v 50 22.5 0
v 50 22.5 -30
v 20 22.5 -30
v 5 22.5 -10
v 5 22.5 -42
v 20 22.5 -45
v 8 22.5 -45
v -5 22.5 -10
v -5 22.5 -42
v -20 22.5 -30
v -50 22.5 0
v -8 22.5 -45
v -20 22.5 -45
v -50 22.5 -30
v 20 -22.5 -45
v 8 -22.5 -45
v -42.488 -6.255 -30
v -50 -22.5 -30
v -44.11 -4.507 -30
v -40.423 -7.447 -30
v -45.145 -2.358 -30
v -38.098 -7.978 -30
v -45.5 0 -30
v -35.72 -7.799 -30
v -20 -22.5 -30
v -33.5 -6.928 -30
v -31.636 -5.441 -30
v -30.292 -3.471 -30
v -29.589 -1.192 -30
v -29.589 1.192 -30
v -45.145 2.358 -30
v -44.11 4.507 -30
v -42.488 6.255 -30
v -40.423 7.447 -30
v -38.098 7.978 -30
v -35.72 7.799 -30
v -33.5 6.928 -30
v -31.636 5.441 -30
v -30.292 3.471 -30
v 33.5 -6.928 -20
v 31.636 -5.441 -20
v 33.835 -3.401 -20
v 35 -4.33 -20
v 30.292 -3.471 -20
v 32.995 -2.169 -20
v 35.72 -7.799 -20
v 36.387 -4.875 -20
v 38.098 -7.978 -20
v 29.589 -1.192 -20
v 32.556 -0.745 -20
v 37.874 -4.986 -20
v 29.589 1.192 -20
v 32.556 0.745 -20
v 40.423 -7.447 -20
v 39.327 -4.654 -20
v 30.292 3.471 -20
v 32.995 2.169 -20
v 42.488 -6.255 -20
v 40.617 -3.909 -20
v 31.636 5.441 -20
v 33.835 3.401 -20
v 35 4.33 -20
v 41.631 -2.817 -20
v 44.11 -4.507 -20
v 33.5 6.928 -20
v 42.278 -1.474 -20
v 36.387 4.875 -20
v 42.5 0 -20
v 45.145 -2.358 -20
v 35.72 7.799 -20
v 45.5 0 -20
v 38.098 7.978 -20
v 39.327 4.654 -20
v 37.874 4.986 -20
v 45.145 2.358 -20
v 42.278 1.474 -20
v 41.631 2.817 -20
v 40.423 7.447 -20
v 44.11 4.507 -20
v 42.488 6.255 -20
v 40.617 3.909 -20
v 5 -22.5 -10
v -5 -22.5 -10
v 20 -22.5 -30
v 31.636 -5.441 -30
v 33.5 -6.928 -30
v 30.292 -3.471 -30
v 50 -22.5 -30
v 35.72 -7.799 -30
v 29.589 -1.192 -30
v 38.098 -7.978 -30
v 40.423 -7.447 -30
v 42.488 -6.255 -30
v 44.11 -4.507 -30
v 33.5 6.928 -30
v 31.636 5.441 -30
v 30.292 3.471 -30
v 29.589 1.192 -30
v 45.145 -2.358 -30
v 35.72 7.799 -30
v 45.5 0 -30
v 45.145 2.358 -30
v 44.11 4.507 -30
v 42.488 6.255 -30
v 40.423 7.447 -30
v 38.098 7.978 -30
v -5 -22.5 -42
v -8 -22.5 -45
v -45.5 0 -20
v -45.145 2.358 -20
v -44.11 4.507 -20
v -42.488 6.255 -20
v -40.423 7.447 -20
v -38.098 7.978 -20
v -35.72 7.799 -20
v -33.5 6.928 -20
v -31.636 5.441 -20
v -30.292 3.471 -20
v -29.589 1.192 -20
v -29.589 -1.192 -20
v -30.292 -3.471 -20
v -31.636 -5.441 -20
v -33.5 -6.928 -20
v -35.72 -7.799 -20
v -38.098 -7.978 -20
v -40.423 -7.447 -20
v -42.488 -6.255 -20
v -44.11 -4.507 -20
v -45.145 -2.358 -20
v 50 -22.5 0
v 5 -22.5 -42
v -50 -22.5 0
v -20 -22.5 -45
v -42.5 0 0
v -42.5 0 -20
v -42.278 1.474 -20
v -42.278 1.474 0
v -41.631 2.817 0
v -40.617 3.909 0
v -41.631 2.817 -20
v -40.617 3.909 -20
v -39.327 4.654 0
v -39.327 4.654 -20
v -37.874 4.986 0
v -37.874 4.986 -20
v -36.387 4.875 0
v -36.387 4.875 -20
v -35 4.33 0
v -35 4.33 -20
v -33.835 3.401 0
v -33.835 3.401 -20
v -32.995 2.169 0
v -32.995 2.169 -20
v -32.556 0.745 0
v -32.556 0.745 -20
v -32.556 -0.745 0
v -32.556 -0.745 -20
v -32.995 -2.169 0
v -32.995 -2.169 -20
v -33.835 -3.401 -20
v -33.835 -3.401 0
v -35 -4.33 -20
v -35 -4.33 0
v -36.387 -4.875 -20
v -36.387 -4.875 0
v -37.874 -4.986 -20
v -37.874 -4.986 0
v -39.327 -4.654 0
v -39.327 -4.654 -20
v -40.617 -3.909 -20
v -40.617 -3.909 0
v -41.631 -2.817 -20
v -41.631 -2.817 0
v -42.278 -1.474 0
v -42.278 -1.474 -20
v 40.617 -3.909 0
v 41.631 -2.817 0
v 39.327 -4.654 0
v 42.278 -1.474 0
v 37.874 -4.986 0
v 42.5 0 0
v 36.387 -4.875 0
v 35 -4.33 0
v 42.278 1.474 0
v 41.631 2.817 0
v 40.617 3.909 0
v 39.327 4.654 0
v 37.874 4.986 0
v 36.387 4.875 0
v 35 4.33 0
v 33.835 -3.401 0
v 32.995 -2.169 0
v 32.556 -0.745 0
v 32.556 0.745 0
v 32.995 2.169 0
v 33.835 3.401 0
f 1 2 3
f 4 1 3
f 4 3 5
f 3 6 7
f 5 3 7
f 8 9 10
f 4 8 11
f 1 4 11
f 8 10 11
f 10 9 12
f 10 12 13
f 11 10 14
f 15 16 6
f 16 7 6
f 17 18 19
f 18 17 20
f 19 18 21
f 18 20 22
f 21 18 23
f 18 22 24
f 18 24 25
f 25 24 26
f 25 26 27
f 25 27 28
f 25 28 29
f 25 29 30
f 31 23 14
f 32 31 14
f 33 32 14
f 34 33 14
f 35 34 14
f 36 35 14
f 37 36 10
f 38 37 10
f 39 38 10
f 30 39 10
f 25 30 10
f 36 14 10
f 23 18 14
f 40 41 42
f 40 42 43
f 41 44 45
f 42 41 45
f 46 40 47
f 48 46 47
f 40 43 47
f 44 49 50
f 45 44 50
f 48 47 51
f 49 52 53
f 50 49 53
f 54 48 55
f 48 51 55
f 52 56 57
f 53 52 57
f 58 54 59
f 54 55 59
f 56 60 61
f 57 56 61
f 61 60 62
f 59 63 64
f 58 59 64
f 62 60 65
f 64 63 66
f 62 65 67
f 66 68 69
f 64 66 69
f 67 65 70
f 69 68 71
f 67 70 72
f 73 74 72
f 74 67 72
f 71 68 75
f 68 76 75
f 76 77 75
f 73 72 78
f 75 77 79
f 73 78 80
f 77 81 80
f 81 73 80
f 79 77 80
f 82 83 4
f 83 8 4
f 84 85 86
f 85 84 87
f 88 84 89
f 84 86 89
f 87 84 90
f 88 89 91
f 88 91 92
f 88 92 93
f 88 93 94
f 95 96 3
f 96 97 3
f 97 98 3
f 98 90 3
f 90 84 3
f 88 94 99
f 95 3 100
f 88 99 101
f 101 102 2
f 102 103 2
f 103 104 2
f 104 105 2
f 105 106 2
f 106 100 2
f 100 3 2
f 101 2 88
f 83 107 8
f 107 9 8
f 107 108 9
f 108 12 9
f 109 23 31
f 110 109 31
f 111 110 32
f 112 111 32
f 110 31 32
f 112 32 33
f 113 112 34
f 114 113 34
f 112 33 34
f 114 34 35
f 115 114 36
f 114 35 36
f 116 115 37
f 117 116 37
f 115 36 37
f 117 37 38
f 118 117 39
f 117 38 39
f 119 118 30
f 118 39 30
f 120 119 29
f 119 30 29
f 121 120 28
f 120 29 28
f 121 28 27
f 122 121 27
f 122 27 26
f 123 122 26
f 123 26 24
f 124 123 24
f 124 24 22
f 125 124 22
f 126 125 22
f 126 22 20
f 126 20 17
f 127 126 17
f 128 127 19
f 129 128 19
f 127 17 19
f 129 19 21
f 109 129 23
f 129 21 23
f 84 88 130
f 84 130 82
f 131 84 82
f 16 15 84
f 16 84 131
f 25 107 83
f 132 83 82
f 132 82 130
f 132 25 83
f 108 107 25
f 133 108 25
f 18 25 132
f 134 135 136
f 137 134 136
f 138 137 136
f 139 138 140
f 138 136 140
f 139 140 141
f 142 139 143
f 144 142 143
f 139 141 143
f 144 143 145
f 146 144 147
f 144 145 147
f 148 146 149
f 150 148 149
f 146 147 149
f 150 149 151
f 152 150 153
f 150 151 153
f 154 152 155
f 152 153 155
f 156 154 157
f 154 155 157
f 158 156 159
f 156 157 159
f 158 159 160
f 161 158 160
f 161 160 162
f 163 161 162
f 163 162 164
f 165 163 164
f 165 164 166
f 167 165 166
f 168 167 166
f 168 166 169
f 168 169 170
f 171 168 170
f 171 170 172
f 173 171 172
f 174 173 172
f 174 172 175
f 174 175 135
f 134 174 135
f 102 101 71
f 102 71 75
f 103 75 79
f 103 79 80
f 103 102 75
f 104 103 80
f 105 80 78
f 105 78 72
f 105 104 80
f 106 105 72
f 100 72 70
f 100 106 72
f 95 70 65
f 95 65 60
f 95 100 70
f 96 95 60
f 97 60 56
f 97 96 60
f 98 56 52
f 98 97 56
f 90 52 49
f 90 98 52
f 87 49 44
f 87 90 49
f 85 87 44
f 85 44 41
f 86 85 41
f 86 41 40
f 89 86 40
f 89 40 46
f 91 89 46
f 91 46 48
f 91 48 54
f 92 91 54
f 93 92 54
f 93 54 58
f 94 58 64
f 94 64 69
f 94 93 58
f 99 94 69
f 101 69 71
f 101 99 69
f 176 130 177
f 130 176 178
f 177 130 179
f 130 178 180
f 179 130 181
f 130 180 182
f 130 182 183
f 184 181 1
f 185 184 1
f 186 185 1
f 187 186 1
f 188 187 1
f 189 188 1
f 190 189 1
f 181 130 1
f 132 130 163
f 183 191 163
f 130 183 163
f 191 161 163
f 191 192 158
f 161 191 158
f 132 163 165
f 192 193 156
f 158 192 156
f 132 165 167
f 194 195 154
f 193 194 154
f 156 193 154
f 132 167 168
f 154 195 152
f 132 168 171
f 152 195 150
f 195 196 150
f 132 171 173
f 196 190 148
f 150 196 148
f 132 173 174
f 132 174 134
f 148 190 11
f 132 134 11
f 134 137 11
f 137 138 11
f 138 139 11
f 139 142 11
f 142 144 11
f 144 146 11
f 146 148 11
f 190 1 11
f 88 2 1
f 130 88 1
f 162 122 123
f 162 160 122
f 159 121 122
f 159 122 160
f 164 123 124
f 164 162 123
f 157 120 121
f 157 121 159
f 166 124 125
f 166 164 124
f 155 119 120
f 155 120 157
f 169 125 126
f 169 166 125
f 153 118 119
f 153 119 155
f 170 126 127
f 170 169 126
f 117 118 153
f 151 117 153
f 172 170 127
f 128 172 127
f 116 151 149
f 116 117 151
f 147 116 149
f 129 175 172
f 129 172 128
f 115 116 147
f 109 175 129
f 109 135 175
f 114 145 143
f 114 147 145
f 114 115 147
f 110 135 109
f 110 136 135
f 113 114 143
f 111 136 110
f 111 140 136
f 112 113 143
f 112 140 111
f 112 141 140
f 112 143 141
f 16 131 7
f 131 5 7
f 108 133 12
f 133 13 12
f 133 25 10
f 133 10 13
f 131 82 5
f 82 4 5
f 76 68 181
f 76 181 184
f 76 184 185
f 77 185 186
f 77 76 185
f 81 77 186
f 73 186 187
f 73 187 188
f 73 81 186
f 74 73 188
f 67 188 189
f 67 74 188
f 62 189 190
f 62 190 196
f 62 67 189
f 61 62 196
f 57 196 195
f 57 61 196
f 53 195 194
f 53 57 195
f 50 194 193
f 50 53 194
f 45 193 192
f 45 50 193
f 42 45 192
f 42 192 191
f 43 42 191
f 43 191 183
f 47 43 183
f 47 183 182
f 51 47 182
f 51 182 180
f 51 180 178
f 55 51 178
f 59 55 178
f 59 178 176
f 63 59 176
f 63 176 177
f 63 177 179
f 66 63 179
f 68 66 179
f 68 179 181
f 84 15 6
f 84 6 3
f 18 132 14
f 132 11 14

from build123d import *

# Parameters (mm, degrees)
EXTRUDE_1_DEPTH     = 22.5
SKETCH_2_R          = 8
CUT_EXTRUDE_1_DEPTH = 10
CUT_EXTRUDE_2_REACH = 62.26
SKETCH_3_R          = 5


with BuildPart() as part:
    # Эскиз1 → Бобышка-Вытянуть1 (new, symmetric)
    with BuildSketch(Plane(origin=(0, 0, 0), x_dir=(1, 0, 0), z_dir=(0, 1, 0))):
        Polygon((50, 0), (-50, 0), (-50, 30), (-20, 30), (-20, 45), (-8, 45), (-5, 42), (-5, 10), (5, 10), (5, 42), (8, 45), (20, 45), (20, 30), (50, 30), align=None)
    extrude(amount=EXTRUDE_1_DEPTH, both=True)

    # Эскиз2 → Вырез-Вытянуть1 (cut)
    with BuildSketch(Plane(origin=(0, 0, -30), x_dir=(-1, 0, 0), z_dir=(0, 0, -1))):
        with Locations((37.5, 0)):
            Circle(SKETCH_2_R)
    cut_extrude_1 = extrude(amount=-CUT_EXTRUDE_1_DEPTH, mode=Mode.SUBTRACT)

    # Эскиз3 → Вырез-Вытянуть2 (cut, up to next)
    with BuildSketch(Plane(origin=(0, 0, -20), x_dir=(-1, 0, 0), z_dir=(0, 0, -1)), mode=Mode.PRIVATE) as cut_extrude_2_sk1:
        with Locations((37.5, 0)):
            Circle(SKETCH_3_R)
    cut_extrude_2_tool1 = extrude(cut_extrude_2_sk1.sketch, amount=-CUT_EXTRUDE_2_REACH, mode=Mode.PRIVATE) & part.part
    cut_extrude_2 = cut_extrude_2_tool1.solids().sort_by_distance((-37.5, 0, -20))[0]
    add(cut_extrude_2, mode=Mode.SUBTRACT)

    # Зеркальное отражение1: Вырез-Вытянуть1, Вырез-Вытянуть2 across plane
    add(cut_extrude_1.mirror(Plane(origin=(0, 0, 0), x_dir=(0, 0, 1), z_dir=(1, 0, 0))), mode=Mode.SUBTRACT)
    add(cut_extrude_2.mirror(Plane(origin=(0, 0, 0), x_dir=(0, 0, 1), z_dir=(1, 0, 0))), mode=Mode.SUBTRACT)


solid = part.part
